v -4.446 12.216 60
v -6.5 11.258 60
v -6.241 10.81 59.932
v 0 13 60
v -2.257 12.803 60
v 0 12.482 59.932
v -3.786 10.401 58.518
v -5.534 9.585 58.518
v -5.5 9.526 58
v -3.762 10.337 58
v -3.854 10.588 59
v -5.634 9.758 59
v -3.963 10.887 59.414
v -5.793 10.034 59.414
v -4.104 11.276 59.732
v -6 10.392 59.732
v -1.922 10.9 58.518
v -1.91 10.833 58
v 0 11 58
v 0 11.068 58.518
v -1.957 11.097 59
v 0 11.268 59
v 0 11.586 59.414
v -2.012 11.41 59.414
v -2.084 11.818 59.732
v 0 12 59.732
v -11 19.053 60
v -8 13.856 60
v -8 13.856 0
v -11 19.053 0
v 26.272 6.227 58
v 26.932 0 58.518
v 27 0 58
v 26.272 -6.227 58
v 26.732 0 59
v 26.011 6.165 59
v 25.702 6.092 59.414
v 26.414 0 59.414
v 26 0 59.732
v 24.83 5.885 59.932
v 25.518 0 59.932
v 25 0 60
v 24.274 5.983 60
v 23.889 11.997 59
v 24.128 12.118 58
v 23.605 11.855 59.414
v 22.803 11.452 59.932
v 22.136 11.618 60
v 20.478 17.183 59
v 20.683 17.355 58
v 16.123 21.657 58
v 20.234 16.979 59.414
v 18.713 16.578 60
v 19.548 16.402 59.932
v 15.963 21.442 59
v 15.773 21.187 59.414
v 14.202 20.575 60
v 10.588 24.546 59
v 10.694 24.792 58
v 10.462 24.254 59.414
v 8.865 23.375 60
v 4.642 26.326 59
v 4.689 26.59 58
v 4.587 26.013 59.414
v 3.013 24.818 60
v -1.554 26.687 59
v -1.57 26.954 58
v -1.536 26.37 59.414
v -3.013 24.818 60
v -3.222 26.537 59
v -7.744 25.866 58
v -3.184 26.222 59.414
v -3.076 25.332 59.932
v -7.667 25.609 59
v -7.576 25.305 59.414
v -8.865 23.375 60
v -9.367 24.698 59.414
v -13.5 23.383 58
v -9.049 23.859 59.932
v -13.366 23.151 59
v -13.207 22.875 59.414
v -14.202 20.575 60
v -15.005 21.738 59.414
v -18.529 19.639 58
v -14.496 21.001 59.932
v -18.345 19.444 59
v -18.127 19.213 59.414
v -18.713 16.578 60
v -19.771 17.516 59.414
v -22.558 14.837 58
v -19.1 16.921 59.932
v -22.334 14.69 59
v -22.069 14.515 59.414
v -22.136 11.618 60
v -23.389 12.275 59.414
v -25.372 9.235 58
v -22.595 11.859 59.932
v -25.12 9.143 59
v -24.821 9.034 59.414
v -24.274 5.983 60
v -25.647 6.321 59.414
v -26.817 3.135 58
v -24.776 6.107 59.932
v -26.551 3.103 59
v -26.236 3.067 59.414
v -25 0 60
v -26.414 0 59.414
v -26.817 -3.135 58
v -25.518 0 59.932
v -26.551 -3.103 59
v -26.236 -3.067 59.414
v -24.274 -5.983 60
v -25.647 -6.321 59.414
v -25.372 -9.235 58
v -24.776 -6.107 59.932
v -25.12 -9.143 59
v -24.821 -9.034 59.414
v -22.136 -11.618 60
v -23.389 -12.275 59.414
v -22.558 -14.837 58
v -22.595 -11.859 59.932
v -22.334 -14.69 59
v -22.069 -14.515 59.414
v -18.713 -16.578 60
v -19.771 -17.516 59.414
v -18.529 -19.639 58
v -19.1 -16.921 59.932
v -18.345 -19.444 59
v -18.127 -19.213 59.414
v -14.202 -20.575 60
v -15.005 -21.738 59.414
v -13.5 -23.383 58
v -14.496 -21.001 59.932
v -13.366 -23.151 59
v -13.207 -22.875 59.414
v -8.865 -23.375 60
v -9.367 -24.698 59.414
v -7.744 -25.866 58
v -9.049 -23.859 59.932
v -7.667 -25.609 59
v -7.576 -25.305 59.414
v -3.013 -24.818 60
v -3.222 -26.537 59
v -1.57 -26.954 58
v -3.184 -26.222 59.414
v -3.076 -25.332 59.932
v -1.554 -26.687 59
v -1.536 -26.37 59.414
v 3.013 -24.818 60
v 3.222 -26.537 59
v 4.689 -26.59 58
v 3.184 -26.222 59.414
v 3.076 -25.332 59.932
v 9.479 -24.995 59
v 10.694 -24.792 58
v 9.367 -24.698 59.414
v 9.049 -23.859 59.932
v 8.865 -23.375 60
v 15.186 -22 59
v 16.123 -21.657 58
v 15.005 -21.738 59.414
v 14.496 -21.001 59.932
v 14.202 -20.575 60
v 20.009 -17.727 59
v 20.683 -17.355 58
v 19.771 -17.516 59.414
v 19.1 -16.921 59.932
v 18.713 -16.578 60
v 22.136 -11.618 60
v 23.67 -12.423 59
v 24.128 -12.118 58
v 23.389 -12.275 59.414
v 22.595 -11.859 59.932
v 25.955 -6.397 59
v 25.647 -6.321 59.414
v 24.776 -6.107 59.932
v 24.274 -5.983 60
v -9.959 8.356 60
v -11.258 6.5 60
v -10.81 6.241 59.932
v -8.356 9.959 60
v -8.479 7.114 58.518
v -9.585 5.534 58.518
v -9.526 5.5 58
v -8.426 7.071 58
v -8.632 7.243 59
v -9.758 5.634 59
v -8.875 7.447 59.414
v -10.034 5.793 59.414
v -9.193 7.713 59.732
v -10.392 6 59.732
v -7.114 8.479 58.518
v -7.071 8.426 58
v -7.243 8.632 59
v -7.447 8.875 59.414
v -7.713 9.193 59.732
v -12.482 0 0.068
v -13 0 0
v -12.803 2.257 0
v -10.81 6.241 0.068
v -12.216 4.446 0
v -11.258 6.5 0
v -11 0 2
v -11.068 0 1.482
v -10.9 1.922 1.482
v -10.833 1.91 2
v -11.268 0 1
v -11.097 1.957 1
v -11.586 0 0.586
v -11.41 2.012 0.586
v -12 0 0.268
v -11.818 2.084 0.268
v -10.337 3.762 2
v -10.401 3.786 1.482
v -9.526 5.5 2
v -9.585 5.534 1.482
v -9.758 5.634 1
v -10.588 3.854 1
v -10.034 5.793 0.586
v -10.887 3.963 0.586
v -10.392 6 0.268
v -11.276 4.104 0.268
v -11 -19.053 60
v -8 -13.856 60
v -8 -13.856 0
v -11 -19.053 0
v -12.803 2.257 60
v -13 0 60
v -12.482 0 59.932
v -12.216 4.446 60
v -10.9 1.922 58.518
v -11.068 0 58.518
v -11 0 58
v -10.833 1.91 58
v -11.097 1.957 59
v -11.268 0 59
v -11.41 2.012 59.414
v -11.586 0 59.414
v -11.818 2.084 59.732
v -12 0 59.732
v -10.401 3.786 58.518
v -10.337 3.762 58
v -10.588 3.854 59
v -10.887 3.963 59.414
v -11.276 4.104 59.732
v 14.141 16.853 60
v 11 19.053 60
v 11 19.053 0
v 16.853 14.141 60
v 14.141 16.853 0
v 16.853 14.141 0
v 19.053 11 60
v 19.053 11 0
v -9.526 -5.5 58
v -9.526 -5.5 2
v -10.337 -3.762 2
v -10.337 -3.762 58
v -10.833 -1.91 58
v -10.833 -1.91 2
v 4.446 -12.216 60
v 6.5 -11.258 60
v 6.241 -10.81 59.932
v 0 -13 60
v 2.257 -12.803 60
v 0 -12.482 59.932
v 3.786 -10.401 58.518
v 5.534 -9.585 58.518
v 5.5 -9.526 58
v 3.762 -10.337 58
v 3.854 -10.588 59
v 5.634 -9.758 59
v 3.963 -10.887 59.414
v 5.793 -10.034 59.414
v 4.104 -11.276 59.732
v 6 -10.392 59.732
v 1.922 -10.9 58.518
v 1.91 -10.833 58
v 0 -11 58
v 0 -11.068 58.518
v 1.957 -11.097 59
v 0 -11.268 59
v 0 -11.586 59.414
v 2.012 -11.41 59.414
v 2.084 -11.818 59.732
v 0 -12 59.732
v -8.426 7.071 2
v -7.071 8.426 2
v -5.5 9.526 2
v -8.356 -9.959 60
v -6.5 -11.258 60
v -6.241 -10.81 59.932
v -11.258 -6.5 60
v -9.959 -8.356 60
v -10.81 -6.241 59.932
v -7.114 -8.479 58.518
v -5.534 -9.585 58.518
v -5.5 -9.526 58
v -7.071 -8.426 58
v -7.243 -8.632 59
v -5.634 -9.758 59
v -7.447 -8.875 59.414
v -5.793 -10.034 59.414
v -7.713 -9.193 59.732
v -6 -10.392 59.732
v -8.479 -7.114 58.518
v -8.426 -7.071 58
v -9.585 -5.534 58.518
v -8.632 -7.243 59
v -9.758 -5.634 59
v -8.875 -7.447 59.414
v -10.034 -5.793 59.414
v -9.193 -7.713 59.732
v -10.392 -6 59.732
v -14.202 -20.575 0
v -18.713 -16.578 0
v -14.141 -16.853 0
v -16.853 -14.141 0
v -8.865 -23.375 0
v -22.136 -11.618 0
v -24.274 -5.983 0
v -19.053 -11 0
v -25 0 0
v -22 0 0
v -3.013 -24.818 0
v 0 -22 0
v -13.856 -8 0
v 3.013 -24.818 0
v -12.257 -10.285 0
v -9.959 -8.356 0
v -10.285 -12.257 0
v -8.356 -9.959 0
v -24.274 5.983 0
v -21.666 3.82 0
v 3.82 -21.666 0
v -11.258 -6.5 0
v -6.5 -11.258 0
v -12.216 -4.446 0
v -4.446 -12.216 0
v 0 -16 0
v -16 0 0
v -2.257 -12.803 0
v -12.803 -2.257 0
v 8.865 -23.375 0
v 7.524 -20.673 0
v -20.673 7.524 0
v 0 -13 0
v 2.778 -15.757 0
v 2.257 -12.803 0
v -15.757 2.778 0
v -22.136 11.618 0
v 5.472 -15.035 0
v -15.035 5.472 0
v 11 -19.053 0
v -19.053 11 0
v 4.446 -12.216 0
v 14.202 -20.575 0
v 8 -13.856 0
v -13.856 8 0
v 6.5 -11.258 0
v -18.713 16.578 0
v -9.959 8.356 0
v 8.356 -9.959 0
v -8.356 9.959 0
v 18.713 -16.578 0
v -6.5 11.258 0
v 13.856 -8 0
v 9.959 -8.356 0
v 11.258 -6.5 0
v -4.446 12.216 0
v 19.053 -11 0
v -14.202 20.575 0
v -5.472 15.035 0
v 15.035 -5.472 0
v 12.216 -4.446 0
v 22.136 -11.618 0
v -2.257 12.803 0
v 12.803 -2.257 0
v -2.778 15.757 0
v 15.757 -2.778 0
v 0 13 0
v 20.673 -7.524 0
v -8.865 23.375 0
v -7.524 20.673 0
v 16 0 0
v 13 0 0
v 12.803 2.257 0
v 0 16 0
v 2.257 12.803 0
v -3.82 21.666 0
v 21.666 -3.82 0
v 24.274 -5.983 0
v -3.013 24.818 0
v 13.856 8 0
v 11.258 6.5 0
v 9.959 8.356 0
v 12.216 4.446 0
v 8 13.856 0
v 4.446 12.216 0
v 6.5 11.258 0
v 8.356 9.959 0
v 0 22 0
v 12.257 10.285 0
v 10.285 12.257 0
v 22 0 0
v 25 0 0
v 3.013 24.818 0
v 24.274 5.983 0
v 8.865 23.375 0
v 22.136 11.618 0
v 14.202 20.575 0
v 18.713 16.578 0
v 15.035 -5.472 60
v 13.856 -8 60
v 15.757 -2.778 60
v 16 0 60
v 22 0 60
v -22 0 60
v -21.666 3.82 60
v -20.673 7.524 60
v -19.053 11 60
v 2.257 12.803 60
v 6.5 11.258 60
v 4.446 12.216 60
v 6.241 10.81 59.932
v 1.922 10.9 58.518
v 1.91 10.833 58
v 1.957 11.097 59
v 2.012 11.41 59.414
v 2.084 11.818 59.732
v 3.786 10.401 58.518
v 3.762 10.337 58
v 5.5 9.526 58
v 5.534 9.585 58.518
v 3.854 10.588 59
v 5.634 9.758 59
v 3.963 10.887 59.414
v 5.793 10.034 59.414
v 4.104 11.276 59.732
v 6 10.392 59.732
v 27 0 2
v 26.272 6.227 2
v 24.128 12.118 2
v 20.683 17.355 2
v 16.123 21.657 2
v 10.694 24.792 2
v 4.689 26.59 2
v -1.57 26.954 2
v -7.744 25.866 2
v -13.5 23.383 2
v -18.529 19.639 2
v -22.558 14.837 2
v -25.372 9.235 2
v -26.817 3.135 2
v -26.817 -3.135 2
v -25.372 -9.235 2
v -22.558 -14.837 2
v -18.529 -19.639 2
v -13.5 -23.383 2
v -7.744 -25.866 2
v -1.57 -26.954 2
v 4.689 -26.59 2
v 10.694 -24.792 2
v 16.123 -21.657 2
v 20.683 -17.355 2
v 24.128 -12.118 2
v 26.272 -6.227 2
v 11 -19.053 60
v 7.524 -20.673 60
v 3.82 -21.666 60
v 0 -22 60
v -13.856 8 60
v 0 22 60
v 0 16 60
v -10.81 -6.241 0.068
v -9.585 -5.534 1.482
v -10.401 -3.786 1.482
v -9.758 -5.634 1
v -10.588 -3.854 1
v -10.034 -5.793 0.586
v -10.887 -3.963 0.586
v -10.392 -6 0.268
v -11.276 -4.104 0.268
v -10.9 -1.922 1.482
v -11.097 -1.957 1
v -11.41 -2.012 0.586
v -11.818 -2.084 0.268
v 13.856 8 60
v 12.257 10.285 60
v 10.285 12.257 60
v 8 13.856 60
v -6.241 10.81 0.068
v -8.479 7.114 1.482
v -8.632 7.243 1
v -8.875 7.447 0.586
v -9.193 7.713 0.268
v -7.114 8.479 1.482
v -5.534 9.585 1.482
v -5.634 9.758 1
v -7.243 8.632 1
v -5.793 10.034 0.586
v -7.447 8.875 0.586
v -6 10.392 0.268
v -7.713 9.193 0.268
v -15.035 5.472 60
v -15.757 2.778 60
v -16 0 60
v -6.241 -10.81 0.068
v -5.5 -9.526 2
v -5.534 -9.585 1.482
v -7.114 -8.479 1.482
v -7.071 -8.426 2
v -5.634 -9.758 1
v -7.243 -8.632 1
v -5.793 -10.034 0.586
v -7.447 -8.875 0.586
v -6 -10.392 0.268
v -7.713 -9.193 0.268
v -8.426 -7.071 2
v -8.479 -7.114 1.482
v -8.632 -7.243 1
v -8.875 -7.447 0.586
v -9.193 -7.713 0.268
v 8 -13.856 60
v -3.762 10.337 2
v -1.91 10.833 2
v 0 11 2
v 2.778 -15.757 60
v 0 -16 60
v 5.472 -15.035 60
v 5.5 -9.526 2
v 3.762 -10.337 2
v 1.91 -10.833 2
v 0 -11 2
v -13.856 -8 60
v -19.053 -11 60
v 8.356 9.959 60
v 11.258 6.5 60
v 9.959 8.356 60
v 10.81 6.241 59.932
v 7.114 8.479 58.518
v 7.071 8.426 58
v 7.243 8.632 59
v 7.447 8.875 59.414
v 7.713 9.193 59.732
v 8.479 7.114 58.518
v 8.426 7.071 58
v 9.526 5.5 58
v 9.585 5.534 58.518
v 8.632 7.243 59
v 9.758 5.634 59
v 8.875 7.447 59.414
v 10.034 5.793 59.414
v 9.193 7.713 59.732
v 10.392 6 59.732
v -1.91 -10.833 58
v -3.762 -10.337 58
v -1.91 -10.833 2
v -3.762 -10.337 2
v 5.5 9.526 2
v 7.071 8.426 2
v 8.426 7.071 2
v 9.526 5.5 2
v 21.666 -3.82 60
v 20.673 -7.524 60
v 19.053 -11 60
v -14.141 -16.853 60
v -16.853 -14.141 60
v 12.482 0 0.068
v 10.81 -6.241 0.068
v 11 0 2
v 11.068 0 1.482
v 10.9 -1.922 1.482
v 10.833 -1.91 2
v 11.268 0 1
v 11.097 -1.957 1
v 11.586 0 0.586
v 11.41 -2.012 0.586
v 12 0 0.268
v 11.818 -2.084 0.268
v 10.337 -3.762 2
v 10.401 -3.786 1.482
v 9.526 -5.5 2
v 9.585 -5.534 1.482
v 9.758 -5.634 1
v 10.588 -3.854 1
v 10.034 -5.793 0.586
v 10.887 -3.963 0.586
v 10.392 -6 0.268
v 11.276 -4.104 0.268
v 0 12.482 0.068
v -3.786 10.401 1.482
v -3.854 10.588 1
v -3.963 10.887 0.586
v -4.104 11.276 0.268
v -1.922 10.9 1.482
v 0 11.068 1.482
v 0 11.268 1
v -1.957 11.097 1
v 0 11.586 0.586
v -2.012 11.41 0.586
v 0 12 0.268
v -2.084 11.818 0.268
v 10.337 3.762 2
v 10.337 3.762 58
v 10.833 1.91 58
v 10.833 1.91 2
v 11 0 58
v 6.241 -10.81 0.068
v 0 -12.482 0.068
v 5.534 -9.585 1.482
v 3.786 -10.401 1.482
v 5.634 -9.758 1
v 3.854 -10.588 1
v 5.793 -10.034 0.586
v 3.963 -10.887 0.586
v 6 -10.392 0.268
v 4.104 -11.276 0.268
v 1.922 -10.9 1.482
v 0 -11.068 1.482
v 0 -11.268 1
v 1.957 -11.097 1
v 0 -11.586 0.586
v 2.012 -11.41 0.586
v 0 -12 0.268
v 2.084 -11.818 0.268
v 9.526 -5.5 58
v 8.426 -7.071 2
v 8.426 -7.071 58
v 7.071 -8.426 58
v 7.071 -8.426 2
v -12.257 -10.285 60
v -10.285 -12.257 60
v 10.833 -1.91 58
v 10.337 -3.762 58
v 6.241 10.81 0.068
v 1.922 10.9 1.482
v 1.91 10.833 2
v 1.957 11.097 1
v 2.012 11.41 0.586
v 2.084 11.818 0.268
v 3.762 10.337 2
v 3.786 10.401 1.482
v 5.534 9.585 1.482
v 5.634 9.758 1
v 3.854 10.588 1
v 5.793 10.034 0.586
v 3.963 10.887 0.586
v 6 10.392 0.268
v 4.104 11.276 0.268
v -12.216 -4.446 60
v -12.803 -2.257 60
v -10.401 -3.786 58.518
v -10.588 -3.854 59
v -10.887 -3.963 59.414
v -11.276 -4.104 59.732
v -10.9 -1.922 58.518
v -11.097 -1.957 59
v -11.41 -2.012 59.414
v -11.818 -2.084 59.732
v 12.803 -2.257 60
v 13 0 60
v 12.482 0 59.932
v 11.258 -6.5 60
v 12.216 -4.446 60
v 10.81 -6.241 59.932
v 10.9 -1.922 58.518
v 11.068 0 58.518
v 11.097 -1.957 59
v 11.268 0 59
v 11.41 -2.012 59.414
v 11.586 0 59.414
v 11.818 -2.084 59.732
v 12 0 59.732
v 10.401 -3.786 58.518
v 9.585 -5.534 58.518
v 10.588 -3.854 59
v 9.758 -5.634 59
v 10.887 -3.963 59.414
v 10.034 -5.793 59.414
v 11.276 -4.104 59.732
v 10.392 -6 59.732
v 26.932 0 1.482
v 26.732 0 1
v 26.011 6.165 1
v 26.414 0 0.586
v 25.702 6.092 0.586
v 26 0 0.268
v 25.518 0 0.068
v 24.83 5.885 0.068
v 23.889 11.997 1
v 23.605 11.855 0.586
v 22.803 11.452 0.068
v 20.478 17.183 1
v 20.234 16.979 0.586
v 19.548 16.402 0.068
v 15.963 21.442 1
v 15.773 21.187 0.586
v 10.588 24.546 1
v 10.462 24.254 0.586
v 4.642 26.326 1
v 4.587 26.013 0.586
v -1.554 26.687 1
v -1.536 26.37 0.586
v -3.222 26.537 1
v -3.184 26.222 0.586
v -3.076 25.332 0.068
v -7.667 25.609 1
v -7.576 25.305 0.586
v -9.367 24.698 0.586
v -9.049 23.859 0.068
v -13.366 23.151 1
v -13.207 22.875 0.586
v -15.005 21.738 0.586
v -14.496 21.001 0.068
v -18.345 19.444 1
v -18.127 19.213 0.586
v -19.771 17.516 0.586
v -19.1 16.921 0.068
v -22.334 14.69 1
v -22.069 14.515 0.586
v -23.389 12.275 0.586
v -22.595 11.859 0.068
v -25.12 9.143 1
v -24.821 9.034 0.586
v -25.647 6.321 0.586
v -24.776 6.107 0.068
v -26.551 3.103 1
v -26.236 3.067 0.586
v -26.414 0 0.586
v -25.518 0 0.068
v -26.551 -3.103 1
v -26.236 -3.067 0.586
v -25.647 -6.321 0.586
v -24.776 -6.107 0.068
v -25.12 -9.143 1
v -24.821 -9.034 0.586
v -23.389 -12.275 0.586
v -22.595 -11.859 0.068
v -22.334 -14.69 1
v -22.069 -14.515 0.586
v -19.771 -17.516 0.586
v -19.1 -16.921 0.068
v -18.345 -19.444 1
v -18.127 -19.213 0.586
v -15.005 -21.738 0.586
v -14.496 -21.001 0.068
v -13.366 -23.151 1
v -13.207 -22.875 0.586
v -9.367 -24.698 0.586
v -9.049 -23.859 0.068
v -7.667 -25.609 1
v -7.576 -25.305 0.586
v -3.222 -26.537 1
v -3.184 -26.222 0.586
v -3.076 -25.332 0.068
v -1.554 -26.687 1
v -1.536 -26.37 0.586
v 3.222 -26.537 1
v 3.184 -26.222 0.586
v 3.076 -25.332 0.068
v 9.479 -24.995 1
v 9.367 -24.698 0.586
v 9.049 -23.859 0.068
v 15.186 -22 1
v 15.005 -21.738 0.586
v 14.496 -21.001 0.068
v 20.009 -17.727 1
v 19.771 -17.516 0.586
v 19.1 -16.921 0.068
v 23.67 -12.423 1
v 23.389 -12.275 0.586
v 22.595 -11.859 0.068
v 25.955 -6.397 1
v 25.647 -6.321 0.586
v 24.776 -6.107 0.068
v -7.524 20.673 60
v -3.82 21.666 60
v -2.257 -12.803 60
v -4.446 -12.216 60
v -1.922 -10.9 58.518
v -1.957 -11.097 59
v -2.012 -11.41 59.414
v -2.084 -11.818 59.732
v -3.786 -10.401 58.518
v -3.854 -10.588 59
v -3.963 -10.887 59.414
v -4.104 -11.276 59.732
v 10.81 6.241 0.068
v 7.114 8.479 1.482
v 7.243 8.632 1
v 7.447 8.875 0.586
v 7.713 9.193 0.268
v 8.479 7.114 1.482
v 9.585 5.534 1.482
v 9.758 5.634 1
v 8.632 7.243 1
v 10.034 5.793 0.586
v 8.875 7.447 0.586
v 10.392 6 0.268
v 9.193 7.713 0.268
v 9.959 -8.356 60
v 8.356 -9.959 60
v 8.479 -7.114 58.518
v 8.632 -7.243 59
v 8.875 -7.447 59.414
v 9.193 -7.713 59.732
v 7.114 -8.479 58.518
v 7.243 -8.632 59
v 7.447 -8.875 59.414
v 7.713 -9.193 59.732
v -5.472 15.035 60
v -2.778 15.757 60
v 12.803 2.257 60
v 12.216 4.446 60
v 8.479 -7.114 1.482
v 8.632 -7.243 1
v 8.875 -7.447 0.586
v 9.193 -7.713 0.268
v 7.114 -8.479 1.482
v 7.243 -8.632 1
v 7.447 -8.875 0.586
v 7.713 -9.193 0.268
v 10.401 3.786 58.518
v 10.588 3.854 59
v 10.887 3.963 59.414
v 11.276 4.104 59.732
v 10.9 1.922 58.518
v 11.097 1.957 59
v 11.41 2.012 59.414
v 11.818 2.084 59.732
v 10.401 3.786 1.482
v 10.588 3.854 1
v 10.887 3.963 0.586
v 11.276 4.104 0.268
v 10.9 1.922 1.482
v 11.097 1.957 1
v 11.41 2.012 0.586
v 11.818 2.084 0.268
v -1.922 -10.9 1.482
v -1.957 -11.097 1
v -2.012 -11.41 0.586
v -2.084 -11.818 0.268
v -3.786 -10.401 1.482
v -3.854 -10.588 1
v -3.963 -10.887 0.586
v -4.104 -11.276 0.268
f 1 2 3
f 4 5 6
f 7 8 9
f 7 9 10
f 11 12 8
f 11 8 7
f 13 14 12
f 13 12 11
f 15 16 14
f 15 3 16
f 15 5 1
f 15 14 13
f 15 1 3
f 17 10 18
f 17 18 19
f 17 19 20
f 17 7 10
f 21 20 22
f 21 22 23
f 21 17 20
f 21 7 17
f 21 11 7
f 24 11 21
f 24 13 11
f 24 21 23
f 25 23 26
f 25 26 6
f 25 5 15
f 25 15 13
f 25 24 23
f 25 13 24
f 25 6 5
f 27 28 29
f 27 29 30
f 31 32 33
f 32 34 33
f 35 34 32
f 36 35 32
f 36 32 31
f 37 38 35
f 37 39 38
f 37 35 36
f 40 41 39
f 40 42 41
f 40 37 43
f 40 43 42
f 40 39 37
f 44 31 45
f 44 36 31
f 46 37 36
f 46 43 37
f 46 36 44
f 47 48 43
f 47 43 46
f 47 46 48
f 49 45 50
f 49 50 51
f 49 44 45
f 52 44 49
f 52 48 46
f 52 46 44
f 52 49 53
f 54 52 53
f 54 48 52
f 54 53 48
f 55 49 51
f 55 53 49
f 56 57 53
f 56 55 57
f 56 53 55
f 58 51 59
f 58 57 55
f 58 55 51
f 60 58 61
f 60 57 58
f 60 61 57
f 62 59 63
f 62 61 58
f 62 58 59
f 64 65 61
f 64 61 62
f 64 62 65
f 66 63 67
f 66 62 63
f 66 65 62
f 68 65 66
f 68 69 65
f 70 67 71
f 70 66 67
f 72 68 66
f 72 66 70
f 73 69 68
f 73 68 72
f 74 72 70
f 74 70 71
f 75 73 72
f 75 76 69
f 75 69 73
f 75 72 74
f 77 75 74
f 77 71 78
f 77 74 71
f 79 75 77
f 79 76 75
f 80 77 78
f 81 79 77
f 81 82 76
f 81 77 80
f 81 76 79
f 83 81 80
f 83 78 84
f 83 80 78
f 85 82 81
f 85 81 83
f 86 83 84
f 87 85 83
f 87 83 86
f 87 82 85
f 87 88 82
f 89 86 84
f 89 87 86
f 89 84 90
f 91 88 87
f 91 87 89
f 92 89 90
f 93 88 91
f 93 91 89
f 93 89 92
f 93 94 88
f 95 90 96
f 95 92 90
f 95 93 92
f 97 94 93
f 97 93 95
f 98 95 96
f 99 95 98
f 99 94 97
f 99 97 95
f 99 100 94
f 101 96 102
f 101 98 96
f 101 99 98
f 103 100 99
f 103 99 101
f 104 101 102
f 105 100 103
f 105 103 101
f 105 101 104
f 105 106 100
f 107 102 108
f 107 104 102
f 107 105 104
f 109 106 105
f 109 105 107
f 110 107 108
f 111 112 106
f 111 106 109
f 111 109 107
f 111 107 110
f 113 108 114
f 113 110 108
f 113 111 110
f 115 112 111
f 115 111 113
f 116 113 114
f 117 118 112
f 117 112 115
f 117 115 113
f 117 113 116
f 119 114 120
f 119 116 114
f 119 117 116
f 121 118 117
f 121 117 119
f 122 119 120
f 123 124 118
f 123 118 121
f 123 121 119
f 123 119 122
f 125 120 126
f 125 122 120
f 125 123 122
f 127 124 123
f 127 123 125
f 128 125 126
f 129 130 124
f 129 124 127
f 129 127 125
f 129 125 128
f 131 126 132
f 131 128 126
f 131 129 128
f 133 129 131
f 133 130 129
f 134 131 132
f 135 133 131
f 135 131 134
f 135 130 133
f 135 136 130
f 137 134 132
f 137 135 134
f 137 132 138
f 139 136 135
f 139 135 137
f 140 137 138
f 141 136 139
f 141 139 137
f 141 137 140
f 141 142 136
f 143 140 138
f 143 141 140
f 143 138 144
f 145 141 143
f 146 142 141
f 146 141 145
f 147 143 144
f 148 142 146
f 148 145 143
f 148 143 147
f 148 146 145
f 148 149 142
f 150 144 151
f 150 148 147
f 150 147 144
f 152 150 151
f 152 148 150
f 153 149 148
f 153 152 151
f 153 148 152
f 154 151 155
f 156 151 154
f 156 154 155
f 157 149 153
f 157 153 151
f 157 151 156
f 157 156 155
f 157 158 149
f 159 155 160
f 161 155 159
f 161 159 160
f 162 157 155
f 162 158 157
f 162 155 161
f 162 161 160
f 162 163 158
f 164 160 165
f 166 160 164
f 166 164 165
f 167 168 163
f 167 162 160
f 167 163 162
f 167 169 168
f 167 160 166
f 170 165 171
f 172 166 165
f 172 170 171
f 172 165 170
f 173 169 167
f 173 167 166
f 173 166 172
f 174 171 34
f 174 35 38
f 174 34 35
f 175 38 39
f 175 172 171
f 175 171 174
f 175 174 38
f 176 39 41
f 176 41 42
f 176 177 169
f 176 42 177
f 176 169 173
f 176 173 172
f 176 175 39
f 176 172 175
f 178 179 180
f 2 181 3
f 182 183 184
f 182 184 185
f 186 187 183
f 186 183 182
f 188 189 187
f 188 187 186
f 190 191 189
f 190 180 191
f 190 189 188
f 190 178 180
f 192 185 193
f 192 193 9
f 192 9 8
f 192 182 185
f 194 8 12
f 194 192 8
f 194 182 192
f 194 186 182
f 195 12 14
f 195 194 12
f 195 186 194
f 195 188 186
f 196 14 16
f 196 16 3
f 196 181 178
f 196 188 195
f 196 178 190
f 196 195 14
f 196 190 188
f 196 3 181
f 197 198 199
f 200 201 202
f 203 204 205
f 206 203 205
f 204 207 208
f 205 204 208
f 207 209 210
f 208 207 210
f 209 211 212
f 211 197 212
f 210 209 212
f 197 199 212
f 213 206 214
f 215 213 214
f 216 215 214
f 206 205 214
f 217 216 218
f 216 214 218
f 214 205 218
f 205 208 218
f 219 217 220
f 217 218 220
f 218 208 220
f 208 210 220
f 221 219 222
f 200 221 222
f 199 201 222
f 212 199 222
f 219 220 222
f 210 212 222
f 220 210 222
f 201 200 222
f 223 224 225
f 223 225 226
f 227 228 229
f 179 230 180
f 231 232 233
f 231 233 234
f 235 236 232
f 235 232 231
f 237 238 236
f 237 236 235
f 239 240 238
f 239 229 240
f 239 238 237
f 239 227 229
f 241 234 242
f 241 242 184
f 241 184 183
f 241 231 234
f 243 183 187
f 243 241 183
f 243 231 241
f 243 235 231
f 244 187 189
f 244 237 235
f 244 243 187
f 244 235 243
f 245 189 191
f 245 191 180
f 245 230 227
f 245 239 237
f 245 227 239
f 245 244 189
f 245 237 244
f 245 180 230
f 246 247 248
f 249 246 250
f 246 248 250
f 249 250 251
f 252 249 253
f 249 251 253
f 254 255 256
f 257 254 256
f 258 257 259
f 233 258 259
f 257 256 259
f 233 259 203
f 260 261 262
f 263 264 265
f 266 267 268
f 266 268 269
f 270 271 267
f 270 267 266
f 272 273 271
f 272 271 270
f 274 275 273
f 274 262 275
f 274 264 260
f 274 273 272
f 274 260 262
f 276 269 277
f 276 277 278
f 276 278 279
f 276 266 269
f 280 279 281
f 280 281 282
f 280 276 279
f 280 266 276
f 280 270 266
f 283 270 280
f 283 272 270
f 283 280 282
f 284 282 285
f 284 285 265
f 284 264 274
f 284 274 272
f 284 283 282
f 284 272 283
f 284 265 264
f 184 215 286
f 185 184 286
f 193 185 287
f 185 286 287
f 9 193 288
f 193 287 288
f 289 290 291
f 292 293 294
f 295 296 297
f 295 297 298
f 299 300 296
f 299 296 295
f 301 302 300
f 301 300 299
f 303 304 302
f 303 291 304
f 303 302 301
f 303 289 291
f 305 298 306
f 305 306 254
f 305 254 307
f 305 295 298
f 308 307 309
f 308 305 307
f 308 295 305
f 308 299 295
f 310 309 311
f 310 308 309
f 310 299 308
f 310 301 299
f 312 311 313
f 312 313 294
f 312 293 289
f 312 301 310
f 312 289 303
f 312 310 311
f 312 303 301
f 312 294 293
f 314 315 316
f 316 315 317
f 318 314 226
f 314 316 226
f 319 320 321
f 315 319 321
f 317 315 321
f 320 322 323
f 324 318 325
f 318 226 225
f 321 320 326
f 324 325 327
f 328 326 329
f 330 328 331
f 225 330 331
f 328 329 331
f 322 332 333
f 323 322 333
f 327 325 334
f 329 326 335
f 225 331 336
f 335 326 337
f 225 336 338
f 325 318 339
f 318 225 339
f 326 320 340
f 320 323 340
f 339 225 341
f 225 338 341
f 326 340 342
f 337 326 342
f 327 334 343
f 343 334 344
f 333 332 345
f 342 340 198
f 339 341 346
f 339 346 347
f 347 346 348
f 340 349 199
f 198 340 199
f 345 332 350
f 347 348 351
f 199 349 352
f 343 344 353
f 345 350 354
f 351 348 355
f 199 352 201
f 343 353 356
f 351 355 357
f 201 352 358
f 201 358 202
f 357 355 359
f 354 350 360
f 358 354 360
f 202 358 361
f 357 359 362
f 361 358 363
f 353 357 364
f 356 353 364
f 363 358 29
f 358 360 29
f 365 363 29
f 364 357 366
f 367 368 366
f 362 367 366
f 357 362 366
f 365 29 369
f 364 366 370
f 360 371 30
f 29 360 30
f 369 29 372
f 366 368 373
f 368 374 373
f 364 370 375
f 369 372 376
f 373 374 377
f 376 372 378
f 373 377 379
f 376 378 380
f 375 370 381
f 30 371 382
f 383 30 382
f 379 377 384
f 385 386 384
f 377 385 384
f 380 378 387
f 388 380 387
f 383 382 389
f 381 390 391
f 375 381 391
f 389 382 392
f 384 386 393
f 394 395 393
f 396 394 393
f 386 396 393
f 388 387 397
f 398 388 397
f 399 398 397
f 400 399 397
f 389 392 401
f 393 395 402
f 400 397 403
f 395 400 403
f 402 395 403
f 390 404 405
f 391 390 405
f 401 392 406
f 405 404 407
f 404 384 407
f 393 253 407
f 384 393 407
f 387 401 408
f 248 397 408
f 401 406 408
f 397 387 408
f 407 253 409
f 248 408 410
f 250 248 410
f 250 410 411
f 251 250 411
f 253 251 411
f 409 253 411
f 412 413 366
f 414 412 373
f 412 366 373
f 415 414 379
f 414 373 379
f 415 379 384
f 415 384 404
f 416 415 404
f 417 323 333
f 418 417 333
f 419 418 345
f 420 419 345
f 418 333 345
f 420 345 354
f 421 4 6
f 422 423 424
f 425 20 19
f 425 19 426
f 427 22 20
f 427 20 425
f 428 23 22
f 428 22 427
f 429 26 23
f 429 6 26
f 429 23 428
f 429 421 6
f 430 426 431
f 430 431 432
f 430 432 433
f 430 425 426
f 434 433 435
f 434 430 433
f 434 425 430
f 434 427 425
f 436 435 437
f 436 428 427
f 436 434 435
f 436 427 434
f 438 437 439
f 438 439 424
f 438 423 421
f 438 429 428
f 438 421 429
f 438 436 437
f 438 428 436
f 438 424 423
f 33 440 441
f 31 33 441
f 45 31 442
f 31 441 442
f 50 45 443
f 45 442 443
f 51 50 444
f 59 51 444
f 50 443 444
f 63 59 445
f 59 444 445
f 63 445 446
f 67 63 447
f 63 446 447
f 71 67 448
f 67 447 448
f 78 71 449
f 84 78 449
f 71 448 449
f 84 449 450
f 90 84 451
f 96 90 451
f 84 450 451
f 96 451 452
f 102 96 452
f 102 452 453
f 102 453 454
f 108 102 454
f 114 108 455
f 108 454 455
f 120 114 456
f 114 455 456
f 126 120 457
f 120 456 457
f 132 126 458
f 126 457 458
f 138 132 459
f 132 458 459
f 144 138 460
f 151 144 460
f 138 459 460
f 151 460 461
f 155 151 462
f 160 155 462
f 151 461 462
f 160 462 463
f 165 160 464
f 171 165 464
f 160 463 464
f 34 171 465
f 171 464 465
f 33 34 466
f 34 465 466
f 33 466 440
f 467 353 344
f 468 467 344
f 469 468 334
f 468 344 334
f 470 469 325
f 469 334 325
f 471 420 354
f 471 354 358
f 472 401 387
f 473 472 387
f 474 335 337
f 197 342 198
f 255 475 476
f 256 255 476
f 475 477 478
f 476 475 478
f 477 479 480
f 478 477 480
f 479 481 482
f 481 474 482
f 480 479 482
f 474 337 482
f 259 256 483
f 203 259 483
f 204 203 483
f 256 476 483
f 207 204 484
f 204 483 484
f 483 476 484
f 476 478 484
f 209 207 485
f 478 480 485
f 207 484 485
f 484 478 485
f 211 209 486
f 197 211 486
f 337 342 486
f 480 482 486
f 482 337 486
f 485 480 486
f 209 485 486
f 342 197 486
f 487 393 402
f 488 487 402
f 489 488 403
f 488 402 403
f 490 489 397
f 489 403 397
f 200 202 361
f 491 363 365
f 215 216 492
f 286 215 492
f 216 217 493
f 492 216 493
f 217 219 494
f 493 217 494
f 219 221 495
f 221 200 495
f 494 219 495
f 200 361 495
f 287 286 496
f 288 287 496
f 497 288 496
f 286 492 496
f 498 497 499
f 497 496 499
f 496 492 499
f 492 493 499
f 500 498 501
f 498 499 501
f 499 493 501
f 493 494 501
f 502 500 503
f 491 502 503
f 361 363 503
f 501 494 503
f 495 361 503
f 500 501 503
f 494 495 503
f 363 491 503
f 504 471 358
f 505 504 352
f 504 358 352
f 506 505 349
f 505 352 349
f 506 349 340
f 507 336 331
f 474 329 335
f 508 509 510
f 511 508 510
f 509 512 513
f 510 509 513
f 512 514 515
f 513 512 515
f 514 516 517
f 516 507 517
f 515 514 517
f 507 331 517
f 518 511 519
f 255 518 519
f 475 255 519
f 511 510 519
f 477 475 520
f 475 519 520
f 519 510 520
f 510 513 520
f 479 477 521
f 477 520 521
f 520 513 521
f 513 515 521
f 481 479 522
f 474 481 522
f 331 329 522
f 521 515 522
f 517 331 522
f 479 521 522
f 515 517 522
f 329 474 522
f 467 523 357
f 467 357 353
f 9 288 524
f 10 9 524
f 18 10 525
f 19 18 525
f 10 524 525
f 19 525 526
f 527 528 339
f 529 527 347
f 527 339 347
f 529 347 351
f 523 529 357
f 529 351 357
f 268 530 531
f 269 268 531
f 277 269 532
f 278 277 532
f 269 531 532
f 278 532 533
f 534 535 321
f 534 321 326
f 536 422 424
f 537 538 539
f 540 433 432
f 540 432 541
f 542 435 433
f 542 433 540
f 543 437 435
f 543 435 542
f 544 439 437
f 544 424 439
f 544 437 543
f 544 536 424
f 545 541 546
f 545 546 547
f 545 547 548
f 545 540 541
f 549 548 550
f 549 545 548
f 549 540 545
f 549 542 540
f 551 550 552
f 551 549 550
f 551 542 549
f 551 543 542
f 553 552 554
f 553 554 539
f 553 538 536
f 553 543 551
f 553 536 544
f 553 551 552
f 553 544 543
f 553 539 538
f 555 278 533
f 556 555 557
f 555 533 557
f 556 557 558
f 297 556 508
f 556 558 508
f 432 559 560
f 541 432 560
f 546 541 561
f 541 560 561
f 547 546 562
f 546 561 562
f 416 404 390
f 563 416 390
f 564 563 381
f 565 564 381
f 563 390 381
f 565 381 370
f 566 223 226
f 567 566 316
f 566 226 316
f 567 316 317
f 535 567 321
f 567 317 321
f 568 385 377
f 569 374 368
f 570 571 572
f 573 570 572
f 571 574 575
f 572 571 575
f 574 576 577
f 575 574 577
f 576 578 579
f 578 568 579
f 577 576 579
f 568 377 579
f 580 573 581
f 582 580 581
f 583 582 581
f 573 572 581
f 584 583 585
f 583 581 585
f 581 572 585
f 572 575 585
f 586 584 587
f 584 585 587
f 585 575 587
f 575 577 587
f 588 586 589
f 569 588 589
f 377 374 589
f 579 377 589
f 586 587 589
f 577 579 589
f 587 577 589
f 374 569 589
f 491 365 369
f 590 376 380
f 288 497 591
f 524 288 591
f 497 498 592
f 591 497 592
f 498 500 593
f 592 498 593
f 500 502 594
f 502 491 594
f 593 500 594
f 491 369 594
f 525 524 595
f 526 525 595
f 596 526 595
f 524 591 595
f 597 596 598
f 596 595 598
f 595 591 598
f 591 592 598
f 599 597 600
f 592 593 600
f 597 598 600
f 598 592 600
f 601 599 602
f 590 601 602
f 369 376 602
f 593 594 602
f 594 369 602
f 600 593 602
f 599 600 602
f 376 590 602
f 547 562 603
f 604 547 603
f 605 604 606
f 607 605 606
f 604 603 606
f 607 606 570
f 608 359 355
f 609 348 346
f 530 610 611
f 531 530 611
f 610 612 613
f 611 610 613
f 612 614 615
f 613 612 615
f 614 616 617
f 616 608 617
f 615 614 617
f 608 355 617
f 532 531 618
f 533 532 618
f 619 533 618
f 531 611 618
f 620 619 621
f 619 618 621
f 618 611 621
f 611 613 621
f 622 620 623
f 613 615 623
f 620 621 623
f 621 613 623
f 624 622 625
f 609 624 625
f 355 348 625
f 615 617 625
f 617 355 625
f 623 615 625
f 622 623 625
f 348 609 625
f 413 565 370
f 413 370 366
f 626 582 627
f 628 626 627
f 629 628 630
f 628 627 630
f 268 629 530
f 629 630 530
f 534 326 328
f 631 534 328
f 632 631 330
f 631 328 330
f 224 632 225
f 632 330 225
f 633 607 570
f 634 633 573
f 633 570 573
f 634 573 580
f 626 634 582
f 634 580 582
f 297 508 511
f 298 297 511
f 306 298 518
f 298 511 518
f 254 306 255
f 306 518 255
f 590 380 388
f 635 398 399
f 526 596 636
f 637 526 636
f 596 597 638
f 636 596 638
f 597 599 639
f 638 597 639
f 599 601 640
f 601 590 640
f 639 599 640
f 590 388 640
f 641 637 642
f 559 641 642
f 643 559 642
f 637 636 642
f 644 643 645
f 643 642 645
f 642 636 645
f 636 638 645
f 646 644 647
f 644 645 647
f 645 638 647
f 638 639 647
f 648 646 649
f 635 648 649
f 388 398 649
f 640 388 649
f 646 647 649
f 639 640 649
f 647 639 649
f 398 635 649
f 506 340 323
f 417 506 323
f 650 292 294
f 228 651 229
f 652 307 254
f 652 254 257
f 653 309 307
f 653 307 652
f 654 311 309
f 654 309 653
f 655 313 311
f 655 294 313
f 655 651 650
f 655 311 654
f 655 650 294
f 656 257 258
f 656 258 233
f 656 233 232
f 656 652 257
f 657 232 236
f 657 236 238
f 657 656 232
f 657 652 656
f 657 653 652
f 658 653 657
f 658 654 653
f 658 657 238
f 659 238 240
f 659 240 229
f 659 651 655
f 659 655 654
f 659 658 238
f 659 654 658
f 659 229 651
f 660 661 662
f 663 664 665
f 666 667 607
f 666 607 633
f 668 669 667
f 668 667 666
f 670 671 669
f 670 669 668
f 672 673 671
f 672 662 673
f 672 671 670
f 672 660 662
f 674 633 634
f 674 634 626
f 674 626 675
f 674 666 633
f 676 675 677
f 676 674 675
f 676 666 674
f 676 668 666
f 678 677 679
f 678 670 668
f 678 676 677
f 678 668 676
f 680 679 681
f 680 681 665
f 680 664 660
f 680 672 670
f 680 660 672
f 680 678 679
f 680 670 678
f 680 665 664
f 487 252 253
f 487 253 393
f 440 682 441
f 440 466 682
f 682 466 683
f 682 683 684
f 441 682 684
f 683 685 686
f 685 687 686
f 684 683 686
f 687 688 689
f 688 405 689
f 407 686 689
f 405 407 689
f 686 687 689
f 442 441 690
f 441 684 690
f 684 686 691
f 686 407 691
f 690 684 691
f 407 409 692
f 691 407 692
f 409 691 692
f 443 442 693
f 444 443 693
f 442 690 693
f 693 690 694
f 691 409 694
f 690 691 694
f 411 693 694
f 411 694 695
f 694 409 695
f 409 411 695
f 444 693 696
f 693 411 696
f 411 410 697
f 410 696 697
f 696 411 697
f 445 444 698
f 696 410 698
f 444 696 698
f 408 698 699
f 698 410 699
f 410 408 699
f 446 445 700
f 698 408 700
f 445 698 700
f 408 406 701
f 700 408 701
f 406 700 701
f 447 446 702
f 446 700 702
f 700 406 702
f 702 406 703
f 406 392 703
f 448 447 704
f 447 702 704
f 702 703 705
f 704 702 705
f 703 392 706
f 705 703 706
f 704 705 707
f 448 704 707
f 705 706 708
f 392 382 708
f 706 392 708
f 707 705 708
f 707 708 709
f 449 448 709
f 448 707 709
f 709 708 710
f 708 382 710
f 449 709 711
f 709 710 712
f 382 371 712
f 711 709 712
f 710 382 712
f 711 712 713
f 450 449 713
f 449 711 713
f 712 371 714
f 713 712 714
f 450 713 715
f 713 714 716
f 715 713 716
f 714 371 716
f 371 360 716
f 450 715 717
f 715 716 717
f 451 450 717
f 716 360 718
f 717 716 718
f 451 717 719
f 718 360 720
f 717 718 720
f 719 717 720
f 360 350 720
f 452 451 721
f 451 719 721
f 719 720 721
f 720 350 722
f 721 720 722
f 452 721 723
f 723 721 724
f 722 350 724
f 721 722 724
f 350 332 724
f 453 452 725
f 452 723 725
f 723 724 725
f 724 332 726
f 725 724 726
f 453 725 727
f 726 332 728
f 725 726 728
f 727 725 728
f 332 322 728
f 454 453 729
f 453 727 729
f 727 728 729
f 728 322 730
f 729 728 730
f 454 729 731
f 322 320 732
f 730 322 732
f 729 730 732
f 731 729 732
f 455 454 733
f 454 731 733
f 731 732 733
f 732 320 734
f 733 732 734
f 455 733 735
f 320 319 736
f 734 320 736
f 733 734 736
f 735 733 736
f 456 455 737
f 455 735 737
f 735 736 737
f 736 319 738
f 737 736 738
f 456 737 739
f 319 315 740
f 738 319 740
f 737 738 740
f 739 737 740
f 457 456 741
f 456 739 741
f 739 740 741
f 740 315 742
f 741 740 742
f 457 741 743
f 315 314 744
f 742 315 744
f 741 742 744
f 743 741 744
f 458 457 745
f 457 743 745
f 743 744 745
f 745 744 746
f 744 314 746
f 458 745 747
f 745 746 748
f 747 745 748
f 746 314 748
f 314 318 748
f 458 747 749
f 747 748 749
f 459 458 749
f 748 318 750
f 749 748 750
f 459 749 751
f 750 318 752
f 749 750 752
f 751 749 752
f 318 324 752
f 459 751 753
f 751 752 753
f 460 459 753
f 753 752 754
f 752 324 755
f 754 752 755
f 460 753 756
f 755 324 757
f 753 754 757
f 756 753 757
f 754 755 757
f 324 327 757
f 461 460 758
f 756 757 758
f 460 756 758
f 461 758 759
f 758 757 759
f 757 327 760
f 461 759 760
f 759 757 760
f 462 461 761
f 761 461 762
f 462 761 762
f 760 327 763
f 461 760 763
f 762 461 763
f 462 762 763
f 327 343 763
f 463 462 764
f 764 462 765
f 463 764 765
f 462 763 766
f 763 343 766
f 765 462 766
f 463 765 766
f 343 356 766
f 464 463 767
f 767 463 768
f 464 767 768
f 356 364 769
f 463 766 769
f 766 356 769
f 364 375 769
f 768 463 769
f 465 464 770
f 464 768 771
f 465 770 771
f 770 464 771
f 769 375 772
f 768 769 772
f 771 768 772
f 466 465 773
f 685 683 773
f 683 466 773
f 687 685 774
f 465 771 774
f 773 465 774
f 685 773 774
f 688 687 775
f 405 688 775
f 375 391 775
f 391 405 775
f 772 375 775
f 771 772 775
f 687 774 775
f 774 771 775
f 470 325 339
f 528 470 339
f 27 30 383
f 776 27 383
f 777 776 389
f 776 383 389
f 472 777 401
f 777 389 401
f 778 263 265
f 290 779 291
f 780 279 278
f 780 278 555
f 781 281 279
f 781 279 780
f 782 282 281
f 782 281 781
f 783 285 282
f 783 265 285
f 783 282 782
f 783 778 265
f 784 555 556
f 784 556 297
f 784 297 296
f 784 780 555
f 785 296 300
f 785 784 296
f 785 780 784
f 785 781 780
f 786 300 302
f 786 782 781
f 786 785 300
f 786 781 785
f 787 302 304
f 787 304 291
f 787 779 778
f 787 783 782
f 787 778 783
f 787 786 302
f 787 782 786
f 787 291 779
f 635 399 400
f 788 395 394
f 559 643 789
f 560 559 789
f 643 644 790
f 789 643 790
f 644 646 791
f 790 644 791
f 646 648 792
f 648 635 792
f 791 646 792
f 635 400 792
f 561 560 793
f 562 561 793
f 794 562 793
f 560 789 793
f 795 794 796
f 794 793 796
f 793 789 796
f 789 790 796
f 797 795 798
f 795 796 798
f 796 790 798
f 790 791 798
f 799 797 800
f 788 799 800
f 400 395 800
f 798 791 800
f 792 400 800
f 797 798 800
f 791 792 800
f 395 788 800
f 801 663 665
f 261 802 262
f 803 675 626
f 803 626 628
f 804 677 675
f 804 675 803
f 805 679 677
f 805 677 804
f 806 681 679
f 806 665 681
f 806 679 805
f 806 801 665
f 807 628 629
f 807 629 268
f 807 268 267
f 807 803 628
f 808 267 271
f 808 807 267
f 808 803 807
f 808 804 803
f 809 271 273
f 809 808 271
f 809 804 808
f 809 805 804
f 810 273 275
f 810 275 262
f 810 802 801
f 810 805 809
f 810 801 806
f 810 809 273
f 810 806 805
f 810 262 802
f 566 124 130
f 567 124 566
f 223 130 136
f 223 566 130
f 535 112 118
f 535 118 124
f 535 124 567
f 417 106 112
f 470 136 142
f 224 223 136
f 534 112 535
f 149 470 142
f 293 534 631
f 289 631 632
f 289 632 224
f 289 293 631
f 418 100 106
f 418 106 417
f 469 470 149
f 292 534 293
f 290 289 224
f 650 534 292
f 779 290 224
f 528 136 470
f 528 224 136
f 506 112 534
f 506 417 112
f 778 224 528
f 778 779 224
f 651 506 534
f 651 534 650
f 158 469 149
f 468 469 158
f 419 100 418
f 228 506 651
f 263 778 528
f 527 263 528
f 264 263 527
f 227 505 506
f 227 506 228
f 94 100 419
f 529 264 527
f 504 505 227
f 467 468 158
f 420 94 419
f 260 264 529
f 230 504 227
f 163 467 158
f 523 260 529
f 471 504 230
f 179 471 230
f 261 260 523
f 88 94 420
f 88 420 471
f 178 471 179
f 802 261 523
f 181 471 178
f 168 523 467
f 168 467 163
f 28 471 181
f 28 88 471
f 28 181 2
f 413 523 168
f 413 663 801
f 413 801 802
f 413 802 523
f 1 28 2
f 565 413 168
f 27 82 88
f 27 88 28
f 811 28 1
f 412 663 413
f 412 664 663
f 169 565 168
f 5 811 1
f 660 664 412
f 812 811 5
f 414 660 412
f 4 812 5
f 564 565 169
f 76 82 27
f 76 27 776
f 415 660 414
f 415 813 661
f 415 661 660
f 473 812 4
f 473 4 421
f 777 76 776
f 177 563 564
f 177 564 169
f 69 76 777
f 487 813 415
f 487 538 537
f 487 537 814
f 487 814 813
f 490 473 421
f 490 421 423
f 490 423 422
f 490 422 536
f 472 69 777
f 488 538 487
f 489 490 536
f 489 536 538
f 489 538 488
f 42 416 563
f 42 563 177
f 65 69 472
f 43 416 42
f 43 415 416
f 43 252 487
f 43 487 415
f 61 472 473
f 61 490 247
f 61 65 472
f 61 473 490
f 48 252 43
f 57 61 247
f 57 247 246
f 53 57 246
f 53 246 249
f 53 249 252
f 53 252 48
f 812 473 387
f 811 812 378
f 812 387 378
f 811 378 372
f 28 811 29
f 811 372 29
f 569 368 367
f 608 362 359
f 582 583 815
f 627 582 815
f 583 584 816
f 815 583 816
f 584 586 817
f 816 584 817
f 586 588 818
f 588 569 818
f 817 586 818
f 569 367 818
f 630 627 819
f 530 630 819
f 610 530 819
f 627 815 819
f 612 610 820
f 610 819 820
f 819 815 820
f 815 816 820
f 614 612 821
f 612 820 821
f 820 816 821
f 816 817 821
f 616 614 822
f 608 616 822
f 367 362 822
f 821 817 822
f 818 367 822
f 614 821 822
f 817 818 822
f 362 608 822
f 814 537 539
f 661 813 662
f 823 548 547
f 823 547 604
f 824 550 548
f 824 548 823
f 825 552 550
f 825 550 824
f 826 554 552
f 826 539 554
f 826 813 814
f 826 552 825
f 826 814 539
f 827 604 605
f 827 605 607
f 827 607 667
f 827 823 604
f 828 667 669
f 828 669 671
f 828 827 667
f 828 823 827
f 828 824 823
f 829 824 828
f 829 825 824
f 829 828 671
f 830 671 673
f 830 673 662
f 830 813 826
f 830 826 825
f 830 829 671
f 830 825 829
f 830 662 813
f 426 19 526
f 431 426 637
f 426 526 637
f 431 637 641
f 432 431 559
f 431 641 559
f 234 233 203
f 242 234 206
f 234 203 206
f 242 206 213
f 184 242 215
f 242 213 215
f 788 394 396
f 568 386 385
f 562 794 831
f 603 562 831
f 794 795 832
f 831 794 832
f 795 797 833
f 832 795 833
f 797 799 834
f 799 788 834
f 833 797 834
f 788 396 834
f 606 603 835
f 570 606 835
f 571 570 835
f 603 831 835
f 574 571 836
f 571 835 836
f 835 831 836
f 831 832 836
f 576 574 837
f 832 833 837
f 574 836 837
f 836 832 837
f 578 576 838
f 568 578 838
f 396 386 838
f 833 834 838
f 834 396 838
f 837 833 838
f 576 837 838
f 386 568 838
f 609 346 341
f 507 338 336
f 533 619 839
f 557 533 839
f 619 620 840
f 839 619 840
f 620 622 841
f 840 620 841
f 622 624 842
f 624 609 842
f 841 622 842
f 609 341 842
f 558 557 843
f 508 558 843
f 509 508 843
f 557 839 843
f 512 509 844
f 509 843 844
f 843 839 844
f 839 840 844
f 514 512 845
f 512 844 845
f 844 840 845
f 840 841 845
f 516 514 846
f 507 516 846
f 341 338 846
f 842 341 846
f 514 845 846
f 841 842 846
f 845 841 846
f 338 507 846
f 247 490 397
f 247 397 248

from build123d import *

# Parameters (mm, degrees)
F0_R     = 27
F1_DEPTH = 60
F2_R     = 2


with BuildPart() as f1:
    # F0 (on Top) → F1 (new body)
    with BuildSketch(Plane.XY):
        Circle(F0_R)
        with BuildLine():
            Line((-19.05255878, -10.9999999404), (-13.8564064606, -8))
            ThreePointArc((-13.8564064606, -8), (-11.313708499, -11.313708499), (-8, -13.8564064606))
            Line((-8, -13.8564064606), (-10.9999999404, -19.05255878))
            ThreePointArc((-10.9999999404, -19.05255878), (-15.5563491018, -15.5563491018), (-19.05255878, -10.9999999404))
        make_face(mode=Mode.SUBTRACT)
        with BuildLine():
            Line((0, -21.9999998808), (0, -16))
            ThreePointArc((0, -16), (4.1411047216, -15.4548132206), (8, -13.8564064606))
            Line((8, -13.8564064606), (10.9999999404, -19.05255878))
            ThreePointArc((10.9999999404, -19.05255878), (5.6940189614, -21.2503680632), (0, -21.9999998808))
        make_face(mode=Mode.SUBTRACT)
        with BuildLine():
            Line((16, 0), (21.9999998808, 0))
            ThreePointArc((21.9999998808, 0), (21.2503680632, -5.6940189614), (19.05255878, -10.9999999404))
            Line((19.05255878, -10.9999999404), (13.8564064606, -8))
            ThreePointArc((13.8564064606, -8), (15.4548132206, -4.1411047216), (16, 0))
        make_face(mode=Mode.SUBTRACT)
        with BuildLine():
            Line((-19.05255878, 10.9999999404), (-13.8564064606, 8))
            ThreePointArc((-13.8564064606, 8), (-15.4548132206, 4.1411047216), (-16, 0))
            Line((-16, 0), (-21.9999998808, 0))
            ThreePointArc((-21.9999998808, 0), (-21.2503680632, 5.6940189614), (-19.05255878, 10.9999999404))
        make_face(mode=Mode.SUBTRACT)
        with BuildLine():
            Line((0, 21.9999998808), (0, 16))
            ThreePointArc((0, 16), (-4.1411047216, 15.4548132206), (-8, 13.8564064606))
            Line((-8, 13.8564064606), (-10.9999999404, 19.05255878))
            ThreePointArc((-10.9999999404, 19.05255878), (-5.6940189614, 21.2503680632), (0, 21.9999998808))
        make_face(mode=Mode.SUBTRACT)
        with BuildLine():
            ThreePointArc((9.5262794416, 5.5), (10.6251840892, 2.8470094961), (11, 0))
            ThreePointArc((11, 0), (10.6251840892, -2.8470094961), (9.5262794416, -5.5))
            ThreePointArc((9.5262794416, -5.5), (7.7781745931, -7.7781745931), (5.5, -9.5262794416))
            ThreePointArc((5.5, -9.5262794416), (2.8470094961, -10.6251840892), (0, -11))
            ThreePointArc((0, -11), (-2.8470094961, -10.6251840892), (-5.5, -9.5262794416))
            ThreePointArc((-5.5, -9.5262794416), (-7.7781745931, -7.7781745931), (-9.5262794416, -5.5))
            ThreePointArc((-9.5262794416, -5.5), (-10.6251840892, -2.8470094961), (-11, 0))
            ThreePointArc((-11, 0), (-10.6251840892, 2.8470094961), (-9.5262794416, 5.5))
            ThreePointArc((-9.5262794416, 5.5), (-7.7781745931, 7.7781745931), (-5.5, 9.5262794416))
            ThreePointArc((-5.5, 9.5262794416), (-2.8470094961, 10.6251840892), (0, 11))
            ThreePointArc((0, 11), (2.8470094961, 10.6251840892), (5.5, 9.5262794416))
            ThreePointArc((5.5, 9.5262794416), (7.7781745931, 7.7781745931), (9.5262794416, 5.5))
        make_face(mode=Mode.SUBTRACT)
        with BuildLine():
            Line((19.05255878, 10.9999999404), (13.8564064606, 8))
            ThreePointArc((13.8564064606, 8), (11.313708499, 11.313708499), (8, 13.8564064606))
            Line((8, 13.8564064606), (10.9999999404, 19.05255878))
            ThreePointArc((10.9999999404, 19.05255878), (15.5563491018, 15.5563491018), (19.05255878, 10.9999999404))
        make_face(mode=Mode.SUBTRACT)
    extrude(amount=F1_DEPTH)

    # F2
    f2_edges = [f1.edges().sort_by_distance(p)[0] for p in [
        (-27, 0, 60),
        (-5.5, 9.526279, 60),
        (-27, 0, 0),
        (-5.5, 9.526279, 0),
    ]]
    fillet(f2_edges, radius=F2_R)


solid = f1.part
